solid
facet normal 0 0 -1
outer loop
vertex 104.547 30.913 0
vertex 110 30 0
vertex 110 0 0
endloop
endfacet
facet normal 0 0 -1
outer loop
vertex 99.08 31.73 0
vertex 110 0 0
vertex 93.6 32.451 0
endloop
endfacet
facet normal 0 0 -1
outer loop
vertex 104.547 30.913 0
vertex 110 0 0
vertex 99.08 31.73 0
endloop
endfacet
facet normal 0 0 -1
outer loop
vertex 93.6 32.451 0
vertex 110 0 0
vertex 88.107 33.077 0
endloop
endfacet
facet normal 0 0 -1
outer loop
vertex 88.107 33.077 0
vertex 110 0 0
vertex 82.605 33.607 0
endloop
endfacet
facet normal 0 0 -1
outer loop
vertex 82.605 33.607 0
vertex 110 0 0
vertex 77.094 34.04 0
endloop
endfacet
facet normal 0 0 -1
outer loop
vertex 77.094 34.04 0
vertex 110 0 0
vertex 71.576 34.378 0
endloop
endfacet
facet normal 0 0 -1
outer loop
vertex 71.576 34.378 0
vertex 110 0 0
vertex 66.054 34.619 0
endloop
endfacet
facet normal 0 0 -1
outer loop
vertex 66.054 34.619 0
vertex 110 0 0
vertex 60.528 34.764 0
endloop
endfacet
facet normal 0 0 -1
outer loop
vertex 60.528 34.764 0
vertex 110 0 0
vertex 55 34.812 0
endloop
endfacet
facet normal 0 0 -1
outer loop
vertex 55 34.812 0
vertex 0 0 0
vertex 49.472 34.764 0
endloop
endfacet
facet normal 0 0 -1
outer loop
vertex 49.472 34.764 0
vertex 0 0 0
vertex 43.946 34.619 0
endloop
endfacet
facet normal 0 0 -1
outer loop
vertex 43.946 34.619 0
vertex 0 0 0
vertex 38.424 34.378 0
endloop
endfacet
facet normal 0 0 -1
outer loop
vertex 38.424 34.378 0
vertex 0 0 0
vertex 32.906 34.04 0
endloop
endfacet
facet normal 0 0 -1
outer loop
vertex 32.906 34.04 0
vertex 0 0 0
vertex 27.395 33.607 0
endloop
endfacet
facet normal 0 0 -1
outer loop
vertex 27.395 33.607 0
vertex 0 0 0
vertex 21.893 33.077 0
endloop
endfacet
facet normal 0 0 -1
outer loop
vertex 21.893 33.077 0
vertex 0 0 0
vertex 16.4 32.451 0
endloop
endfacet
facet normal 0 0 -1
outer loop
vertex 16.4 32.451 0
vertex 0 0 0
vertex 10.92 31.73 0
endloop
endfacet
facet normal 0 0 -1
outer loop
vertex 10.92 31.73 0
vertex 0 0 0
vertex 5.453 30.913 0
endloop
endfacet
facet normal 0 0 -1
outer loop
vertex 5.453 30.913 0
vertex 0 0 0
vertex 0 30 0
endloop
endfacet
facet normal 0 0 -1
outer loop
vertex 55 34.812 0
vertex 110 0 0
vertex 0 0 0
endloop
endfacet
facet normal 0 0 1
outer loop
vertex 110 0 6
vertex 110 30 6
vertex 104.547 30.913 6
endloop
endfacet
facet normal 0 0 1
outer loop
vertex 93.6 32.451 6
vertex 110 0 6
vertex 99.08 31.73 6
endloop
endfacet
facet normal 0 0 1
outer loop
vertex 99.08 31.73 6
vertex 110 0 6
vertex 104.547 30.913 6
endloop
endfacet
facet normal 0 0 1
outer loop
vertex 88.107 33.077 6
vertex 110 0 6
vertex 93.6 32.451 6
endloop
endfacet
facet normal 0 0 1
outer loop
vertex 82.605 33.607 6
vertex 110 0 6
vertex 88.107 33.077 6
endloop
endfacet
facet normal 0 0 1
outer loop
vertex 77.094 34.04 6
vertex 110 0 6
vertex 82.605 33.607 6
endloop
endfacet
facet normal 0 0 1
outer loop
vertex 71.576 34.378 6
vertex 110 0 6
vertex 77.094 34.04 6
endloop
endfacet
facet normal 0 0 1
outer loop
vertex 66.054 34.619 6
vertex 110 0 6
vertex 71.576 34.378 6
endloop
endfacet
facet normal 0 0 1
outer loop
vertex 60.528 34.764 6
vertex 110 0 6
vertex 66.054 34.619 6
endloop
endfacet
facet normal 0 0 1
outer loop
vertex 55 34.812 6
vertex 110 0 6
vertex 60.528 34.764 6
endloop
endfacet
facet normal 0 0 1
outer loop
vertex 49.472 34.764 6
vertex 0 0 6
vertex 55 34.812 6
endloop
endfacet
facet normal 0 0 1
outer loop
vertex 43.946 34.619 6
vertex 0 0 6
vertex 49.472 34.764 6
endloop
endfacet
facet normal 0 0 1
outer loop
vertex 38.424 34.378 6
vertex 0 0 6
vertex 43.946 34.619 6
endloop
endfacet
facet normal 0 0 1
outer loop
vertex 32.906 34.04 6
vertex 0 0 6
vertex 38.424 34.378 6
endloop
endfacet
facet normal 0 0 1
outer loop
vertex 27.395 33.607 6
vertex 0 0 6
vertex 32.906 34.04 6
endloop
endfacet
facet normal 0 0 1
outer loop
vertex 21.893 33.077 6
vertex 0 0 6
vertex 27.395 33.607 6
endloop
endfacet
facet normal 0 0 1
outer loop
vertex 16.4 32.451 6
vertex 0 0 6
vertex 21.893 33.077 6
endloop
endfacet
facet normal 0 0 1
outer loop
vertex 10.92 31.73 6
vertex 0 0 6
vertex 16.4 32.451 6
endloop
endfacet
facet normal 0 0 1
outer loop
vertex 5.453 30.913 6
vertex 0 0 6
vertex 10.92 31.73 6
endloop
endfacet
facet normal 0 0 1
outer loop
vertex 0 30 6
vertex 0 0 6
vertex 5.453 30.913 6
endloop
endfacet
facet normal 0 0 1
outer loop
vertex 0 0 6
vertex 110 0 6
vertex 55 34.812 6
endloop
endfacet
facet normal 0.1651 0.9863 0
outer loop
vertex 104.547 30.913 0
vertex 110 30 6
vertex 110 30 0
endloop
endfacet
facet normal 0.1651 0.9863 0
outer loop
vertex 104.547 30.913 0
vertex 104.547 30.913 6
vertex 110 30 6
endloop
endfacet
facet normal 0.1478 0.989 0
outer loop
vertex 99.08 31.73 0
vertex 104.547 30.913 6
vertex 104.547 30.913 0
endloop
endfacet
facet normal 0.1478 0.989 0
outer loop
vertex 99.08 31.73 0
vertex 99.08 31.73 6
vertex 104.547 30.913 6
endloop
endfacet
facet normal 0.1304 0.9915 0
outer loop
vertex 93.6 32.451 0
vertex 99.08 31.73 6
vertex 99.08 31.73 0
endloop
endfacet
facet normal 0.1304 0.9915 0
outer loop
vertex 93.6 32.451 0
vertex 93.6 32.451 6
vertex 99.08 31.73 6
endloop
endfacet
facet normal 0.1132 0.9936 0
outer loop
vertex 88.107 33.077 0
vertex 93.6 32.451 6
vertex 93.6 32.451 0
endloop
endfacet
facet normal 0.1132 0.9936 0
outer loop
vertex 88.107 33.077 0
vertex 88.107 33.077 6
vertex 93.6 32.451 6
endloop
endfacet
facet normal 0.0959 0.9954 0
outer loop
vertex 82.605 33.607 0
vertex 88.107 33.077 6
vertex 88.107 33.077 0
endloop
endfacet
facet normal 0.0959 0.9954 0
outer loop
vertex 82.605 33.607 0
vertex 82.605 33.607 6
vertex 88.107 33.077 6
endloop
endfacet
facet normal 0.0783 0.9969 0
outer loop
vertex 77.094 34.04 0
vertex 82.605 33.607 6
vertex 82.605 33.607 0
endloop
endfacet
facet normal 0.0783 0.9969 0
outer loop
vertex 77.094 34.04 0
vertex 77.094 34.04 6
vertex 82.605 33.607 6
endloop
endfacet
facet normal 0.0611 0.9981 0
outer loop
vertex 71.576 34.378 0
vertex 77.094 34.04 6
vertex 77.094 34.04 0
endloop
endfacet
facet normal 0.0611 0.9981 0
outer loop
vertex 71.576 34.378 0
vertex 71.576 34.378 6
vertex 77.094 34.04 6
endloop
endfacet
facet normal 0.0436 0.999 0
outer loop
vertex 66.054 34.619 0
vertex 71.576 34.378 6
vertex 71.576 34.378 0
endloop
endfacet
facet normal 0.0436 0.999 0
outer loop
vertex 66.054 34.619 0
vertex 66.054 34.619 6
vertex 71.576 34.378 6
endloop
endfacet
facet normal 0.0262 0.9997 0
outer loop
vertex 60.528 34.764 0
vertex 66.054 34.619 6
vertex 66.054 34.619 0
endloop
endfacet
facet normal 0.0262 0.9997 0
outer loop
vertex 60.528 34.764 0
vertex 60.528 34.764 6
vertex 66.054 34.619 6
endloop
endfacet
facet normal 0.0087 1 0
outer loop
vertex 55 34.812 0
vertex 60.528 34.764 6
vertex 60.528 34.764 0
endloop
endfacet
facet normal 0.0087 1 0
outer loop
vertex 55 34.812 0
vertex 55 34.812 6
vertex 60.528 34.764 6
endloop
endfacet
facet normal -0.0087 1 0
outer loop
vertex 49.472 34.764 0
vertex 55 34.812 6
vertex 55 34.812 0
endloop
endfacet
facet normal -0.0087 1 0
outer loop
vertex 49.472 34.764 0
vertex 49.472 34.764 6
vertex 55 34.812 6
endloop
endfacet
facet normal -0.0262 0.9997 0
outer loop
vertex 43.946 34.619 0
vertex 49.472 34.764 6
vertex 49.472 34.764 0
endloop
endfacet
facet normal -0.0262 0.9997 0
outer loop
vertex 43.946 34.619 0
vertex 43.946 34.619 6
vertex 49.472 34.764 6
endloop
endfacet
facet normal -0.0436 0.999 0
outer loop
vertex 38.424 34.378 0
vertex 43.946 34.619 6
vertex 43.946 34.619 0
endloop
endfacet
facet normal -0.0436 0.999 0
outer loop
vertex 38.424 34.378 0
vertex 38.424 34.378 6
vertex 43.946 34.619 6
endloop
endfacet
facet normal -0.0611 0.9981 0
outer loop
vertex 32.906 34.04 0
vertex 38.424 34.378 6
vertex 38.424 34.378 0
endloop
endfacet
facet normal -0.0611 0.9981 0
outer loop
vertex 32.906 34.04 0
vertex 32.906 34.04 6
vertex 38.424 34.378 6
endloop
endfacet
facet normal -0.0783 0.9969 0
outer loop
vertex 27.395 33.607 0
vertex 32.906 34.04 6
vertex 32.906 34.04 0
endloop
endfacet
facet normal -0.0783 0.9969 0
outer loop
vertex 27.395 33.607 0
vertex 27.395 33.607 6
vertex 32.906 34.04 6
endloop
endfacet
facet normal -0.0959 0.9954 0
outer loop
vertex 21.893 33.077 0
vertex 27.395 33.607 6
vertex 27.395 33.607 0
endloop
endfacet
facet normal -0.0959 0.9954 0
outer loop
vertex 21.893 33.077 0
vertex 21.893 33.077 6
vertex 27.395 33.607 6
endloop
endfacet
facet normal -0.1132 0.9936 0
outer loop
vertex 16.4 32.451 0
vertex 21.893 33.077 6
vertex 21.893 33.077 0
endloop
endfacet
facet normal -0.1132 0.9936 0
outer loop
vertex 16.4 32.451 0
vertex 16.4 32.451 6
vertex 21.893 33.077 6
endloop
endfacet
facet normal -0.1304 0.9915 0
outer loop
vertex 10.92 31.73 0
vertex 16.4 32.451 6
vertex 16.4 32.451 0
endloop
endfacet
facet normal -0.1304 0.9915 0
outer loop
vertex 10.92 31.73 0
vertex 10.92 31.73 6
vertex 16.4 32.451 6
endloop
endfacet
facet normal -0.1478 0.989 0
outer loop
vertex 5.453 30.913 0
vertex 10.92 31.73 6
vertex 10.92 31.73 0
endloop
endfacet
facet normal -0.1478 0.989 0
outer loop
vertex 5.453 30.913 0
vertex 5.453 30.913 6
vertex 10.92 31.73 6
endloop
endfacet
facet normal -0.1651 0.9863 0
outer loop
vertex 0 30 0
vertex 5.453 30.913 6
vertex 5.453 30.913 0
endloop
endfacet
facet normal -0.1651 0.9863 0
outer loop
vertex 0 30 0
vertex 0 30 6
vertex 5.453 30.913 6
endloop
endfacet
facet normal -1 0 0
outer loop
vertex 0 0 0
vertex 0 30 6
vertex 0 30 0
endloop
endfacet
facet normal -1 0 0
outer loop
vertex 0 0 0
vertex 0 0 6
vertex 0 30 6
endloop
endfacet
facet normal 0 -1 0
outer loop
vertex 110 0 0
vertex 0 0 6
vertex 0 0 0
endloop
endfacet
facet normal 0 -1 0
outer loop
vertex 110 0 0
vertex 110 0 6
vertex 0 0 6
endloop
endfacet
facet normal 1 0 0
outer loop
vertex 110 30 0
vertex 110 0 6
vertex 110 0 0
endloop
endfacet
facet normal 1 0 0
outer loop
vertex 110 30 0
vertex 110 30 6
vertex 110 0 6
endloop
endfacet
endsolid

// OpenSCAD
$fn = 32;

// ----------------------------------------------------------------------
// Arc profile plate: crown, 23 points
// ----------------------------------------------------------------------

// --- parameters (mm) ---
bar_l = 110;              // bar length, X
bar_w = 30;               // bar height at the ends, Y
arc_r = 316.73;           // radius of the crown arc
arc_angle = 20;           // crown arc angle, degrees
crown_rise = 4.81;        // rise of the crown over the ends
arc_step = 1;             // sampling step of the crown arc, degrees
plate_t = 6;              // plate thickness, Z
fit_tol = 0.1;            // declared fit tolerance (prompt contract)
free_tol = 0.5;           // declared free tolerance (prompt contract)

bbox_y = bar_w + crown_rise;  // full height with the crown

profile = [[110, 30], [104.547, 30.913], [99.08, 31.73], [93.6, 32.451], [88.107, 33.077], [82.605, 33.607], [77.094, 34.04], [71.576, 34.378], [66.054, 34.619], [60.528, 34.764], [55, 34.812], [49.472, 34.764], [43.946, 34.619], [38.424, 34.378], [32.906, 34.04], [27.395, 33.607], [21.893, 33.077], [16.4, 32.451], [10.92, 31.73], [5.453, 30.913], [0, 30], [0, 0], [110, 0]];  // primary outline, 23 points, counter clockwise

// --- the one profile operation ---
linear_extrude(height = plate_t) polygon(points = profile);
